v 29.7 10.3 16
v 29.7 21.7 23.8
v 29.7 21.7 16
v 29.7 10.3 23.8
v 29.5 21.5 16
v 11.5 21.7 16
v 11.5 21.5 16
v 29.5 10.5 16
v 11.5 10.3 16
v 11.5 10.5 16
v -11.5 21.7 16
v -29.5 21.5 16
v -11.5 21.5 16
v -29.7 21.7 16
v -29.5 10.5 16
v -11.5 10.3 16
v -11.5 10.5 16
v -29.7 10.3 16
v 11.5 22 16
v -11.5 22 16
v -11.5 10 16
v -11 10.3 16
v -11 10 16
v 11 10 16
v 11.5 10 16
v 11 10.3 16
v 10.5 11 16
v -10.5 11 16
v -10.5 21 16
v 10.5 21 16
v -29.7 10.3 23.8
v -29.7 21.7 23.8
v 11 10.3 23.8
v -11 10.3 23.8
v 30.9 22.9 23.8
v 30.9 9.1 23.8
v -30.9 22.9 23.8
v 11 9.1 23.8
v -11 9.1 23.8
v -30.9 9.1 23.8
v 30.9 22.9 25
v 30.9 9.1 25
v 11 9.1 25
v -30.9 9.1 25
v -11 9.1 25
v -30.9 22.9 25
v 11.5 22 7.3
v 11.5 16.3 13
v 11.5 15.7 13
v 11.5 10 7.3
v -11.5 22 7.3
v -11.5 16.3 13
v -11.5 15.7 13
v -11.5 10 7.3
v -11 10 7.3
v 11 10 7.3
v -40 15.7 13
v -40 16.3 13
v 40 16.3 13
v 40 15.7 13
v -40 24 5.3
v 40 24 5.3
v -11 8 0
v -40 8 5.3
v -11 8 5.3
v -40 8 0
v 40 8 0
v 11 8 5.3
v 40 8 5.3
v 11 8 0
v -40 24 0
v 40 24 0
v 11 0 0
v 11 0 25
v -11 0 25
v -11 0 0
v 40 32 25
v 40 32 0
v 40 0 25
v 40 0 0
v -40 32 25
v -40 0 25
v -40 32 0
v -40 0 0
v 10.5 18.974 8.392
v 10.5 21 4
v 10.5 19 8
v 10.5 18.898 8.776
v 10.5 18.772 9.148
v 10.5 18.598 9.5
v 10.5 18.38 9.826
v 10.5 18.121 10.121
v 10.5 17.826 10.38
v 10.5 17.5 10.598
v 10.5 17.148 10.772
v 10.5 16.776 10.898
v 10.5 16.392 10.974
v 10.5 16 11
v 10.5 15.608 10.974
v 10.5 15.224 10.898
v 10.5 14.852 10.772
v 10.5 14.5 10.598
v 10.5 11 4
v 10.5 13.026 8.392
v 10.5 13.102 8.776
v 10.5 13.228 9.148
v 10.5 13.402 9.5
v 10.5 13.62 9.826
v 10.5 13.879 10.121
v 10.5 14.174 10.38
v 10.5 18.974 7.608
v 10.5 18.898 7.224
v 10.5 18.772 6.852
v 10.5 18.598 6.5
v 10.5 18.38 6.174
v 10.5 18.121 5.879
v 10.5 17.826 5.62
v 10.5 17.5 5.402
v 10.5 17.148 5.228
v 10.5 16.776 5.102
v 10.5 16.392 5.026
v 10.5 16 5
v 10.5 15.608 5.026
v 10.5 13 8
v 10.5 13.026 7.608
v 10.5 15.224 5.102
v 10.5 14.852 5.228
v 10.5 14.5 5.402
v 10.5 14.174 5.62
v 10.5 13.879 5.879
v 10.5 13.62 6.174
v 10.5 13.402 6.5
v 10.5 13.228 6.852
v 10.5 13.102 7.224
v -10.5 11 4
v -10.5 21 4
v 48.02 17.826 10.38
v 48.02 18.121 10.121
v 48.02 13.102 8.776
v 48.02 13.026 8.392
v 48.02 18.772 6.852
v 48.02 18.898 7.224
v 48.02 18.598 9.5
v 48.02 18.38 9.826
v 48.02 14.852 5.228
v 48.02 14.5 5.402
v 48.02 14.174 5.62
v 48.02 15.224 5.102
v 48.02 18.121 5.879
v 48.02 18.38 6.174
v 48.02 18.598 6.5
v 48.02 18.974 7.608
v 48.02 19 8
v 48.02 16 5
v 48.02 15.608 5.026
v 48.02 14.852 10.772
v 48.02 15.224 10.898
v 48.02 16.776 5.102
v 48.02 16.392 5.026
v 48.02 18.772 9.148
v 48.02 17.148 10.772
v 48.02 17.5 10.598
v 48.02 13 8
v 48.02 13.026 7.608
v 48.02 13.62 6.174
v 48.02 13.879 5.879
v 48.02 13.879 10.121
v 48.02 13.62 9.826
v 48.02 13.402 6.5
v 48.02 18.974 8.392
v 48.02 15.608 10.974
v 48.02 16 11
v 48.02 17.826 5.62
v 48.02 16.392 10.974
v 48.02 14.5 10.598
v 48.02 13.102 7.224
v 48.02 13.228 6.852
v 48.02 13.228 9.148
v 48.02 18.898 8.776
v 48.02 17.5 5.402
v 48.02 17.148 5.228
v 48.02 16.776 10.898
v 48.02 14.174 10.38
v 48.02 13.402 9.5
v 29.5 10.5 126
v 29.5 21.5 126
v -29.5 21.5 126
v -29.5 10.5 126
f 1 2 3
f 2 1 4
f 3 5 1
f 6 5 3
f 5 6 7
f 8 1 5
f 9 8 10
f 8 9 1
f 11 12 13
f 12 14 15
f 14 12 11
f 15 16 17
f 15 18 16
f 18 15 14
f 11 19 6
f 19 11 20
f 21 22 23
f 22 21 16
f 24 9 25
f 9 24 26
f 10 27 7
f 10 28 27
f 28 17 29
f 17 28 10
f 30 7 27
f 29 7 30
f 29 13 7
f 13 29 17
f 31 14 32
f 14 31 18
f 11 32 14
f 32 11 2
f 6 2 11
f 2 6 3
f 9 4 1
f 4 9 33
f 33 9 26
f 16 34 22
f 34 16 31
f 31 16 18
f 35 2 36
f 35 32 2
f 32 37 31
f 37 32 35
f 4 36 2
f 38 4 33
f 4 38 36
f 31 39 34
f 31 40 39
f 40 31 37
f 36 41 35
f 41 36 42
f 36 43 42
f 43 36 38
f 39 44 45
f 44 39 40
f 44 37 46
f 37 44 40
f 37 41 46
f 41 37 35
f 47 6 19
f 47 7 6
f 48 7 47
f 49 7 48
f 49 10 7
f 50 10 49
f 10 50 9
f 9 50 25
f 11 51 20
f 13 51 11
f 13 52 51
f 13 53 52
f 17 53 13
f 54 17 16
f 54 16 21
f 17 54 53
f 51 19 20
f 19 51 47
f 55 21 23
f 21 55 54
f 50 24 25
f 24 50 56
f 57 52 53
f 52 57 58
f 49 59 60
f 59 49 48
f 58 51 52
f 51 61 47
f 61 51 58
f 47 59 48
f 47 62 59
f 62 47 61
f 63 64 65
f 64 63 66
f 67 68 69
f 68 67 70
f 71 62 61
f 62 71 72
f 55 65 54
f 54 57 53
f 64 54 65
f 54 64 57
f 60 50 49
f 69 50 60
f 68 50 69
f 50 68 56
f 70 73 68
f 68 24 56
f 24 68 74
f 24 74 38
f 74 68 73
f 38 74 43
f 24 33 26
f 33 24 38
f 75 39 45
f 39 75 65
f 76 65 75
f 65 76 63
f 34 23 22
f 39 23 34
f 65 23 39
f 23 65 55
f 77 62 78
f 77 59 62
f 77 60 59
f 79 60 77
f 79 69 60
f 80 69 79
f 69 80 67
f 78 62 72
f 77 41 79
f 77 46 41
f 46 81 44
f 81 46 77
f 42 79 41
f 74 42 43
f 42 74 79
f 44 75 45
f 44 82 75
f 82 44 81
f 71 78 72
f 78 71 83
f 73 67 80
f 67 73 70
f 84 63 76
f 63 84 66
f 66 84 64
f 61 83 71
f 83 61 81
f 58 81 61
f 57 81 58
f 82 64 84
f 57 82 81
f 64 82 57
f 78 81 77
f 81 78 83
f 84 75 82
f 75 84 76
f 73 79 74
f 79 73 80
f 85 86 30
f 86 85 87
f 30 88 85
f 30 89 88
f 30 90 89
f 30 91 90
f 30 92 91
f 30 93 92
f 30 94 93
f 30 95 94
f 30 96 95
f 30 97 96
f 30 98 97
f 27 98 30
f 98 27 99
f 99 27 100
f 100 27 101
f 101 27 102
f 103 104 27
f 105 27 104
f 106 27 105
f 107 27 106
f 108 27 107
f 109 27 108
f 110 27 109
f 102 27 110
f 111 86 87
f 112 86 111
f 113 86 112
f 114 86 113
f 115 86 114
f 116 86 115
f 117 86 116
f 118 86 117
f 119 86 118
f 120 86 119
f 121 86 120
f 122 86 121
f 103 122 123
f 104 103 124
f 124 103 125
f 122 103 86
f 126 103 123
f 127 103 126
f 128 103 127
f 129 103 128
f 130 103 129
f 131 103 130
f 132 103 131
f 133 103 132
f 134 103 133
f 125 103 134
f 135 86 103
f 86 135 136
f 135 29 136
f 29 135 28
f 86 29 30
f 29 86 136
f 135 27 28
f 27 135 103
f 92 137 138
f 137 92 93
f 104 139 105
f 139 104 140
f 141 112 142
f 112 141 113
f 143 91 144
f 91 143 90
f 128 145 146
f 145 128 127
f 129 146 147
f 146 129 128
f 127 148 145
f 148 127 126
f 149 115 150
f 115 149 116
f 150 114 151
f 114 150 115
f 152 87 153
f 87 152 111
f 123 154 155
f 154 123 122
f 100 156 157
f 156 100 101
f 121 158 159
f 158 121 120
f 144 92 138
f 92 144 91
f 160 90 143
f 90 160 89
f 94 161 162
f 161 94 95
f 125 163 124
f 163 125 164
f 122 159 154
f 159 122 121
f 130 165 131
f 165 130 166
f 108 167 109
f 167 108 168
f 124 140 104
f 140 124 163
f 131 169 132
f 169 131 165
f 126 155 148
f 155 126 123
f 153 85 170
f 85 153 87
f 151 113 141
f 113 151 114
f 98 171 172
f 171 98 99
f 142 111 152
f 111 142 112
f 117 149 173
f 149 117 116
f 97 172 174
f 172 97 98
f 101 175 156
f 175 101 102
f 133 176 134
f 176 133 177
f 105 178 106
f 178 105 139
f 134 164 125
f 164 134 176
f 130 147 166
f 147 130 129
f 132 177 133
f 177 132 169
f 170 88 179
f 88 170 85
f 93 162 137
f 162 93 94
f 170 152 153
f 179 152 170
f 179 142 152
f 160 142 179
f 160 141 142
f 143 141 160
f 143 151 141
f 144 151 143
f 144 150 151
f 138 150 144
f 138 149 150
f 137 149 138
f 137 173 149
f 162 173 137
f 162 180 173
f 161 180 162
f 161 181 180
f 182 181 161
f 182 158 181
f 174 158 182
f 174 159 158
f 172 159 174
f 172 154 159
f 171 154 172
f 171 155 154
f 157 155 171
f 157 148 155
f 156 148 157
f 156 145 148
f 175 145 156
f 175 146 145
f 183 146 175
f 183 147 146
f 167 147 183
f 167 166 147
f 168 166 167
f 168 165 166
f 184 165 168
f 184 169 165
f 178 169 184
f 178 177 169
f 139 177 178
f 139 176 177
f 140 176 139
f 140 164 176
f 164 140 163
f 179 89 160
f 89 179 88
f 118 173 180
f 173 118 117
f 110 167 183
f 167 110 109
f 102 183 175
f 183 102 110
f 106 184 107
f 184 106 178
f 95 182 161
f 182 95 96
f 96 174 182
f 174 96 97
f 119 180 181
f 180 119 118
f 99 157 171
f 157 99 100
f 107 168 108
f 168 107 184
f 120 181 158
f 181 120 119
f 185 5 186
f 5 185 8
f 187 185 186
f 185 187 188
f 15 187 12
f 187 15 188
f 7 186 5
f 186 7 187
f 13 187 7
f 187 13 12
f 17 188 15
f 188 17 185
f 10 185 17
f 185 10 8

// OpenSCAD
// Assembled visual check: holder + mock hub + mock right-angle plug, coloured.
// Not for printing. Render with shots.sh. Set SECTION=true to cut the near half.

NO_AUTO_RENDER = true;
include <hub_holder.scad>

SECTION = is_undef(SECTION) ? false : SECTION;

hub_bottom_z = total_h - pocket_depth;

module mock_hub() {
    translate([-hub_width/2, slot_cy - hub_thickness/2, hub_bottom_z])
        cube([hub_width, hub_thickness, hub_length]);
}

module mock_plug() {
    body_h = min(plug_body_height, 12);
    zc = hub_bottom_z - body_h + cable_diameter/2 + 1;   // cable centre height
    // straight-down plug body under the hub
    translate([-plug_body_width/2, slot_cy - plug_body_thickness/2, hub_bottom_z - body_h])
        cube([plug_body_width, plug_body_thickness, body_h]);
    // dogleg: cable turns 90 deg and runs out the RIGHT side (left is symmetric)
    hull() {
        translate([0, slot_cy, zc]) rotate([0, 90, 0])
            cylinder(d = cable_diameter, h = eps);
        translate([block_width/2 + 8, slot_cy, zc]) rotate([0, 90, 0])
            cylinder(d = cable_diameter, h = eps);
    }
}

module scene() {
    color([0.72, 0.74, 0.78]) holder();
    color([0.20, 0.50, 0.85]) mock_hub();
    color([0.95, 0.25, 0.75]) mock_plug();
}

if (SECTION)
    difference() { scene(); translate([0, -60, -60]) cube([60, 160, 260]); }
else
    scene();
